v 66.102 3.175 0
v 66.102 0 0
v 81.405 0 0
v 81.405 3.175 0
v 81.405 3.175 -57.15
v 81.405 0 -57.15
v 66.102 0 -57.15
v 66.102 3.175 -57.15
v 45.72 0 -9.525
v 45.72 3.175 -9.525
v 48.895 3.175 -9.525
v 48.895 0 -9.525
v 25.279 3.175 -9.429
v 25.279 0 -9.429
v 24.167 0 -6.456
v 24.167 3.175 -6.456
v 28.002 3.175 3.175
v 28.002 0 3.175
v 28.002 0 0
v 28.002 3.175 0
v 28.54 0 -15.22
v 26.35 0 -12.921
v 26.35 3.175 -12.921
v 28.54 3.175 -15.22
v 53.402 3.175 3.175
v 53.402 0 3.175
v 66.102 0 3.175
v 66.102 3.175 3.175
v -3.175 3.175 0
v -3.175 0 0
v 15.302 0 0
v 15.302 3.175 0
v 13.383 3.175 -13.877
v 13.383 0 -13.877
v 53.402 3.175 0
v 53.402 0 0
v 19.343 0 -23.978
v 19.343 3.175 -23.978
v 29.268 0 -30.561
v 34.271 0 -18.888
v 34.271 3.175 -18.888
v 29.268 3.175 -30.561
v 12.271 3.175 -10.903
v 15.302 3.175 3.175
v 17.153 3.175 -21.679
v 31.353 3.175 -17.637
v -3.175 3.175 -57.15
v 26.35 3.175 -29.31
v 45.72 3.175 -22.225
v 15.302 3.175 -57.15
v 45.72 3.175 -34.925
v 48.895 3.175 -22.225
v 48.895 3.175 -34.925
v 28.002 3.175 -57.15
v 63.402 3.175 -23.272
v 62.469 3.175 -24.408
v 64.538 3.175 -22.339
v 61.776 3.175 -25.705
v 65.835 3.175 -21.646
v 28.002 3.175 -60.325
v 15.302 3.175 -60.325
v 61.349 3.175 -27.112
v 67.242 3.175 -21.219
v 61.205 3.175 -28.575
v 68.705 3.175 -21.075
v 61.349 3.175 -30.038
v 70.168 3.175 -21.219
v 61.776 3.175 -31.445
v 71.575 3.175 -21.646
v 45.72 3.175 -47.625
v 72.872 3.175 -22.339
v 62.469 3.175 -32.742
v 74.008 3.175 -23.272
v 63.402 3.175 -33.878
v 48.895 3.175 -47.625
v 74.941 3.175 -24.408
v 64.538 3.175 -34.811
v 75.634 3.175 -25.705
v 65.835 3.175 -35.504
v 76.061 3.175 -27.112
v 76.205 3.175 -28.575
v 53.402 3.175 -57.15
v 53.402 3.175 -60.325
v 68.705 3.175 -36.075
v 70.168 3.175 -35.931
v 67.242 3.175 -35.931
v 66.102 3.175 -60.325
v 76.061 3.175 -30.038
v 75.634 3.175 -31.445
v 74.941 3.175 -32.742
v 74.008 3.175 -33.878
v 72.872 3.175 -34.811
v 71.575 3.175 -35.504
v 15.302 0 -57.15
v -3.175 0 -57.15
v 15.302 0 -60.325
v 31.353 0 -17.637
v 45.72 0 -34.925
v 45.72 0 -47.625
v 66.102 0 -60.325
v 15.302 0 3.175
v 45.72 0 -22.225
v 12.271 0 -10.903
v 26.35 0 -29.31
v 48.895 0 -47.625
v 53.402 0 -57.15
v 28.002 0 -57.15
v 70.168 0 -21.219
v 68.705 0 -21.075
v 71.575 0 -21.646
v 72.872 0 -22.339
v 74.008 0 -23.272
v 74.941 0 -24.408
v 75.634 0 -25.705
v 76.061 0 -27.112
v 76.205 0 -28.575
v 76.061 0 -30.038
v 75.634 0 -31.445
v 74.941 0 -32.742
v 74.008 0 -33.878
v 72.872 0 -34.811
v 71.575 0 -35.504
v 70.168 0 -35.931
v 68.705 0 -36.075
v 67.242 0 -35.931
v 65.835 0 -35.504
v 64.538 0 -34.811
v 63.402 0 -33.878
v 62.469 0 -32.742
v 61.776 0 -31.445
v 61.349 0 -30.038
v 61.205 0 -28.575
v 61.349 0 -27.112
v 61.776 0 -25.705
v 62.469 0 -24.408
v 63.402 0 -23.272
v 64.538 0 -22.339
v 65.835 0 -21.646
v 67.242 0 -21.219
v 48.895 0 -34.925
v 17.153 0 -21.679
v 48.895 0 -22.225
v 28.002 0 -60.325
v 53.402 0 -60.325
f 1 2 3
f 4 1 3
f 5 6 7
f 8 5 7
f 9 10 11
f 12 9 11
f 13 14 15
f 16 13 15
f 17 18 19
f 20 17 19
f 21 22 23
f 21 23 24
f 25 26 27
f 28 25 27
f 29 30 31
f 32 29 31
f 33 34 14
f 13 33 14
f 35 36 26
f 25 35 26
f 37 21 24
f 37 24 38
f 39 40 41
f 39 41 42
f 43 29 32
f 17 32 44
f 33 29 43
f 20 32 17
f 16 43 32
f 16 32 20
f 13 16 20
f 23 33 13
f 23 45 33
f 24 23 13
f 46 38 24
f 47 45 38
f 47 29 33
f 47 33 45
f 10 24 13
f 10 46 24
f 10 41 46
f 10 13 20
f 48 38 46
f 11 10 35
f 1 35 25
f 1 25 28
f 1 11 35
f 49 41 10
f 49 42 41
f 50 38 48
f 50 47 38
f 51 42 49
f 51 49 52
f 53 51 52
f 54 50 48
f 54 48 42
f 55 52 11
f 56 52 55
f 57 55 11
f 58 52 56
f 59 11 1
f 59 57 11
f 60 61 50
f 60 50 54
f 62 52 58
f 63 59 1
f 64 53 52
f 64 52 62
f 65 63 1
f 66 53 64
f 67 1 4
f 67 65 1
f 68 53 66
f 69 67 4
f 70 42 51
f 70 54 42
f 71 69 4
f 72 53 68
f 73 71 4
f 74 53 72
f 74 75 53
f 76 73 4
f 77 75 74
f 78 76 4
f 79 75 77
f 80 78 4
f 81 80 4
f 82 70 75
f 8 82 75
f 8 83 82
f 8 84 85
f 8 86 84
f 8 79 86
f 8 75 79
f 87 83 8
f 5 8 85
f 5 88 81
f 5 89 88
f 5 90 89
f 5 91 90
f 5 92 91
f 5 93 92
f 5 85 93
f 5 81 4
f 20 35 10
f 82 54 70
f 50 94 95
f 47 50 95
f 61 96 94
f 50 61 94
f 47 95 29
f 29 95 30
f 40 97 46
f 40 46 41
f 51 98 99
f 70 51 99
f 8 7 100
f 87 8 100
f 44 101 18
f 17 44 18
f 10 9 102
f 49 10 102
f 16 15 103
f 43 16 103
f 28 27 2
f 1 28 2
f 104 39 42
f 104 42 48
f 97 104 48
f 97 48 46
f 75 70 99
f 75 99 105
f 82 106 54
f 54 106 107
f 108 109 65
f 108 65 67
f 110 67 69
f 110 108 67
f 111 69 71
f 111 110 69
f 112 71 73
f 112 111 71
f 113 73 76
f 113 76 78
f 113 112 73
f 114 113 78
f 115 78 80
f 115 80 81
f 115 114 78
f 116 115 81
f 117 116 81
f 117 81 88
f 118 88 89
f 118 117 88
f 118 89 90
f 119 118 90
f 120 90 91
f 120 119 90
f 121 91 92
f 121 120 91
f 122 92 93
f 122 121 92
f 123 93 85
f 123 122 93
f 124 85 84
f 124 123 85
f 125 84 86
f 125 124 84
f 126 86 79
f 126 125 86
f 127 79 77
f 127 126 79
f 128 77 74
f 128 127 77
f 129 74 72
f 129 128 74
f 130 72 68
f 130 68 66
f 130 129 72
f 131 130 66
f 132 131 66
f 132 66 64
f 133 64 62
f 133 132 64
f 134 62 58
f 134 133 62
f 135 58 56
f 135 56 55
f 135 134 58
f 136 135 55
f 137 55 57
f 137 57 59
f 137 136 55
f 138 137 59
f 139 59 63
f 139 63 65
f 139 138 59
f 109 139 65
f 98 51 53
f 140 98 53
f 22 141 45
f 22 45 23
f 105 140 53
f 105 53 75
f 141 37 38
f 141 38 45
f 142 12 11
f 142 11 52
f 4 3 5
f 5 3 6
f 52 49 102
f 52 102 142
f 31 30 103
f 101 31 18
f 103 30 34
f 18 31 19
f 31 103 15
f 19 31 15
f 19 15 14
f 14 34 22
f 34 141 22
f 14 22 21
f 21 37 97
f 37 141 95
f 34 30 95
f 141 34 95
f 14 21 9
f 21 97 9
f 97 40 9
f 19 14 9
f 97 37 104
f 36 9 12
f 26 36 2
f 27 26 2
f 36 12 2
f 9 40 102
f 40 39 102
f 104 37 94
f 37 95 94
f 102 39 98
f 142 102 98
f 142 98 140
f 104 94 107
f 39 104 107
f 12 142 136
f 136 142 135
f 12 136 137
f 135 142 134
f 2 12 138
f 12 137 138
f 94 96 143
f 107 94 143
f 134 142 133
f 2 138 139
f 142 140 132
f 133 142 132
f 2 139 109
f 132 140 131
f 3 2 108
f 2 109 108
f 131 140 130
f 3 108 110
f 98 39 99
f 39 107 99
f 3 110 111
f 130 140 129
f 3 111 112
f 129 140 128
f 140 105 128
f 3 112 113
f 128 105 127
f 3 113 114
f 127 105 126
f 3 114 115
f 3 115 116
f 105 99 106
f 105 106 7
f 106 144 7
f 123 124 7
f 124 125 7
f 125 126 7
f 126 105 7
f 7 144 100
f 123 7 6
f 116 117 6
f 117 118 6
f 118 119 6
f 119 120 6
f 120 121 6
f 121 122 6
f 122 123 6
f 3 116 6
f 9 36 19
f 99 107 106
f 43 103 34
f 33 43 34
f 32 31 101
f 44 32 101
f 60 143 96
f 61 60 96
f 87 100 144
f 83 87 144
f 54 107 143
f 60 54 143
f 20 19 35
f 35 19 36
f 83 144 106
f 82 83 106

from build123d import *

# Parameters (mm, degrees)
SKETCH1_R           = 7.5
SKETCH1_W           = 3.175
SKETCH1_H           = 12.7
BOSS_EXTRUDE1_DEPTH = 3.175


with BuildPart() as part:
    # Sketch1 → Boss-Extrude1 (new body)
    with BuildSketch(Plane(origin=(0, 0, 0), x_dir=(1, 0, 0), z_dir=(0, 1, 0))):
        Polygon((0, 0), (15.302420881, 0), (15.302420881, -3.175), (28.002420881, -3.175), (28.002420881, 0), (53.402420881, 0), (53.402420881, -3.175), (66.102420881, -3.175), (66.102420881, 0), (81.404841762, 0), (81.404841762, 19.05), (81.404841762, 38.1), (81.404841762, 57.15), (66.102420881, 57.15), (66.102420881, 60.325), (53.402420881, 60.325), (53.402420881, 57.15), (28.002420881, 57.15), (28.002420881, 60.325), (15.302420881, 60.325), (15.302420881, 57.15), (0, 57.15), (-3.175, 57.15), (-3.175, 0), align=None)
        with Locations(Location((68.704841762, 28.575, 0), (0, 0, 270))):
            Circle(SKETCH1_R, mode=Mode.SUBTRACT)
        with Locations((47.3075, 15.875)):
            Rectangle(SKETCH1_W, SKETCH1_H, mode=Mode.SUBTRACT)
        with Locations((47.3075, 41.275)):
            Rectangle(SKETCH1_W, SKETCH1_H, mode=Mode.SUBTRACT)
        Polygon((26.350084324, 29.310366676), (31.353146576, 17.637347868), (34.271401278, 18.888113431), (29.268339026, 30.561132239), align=None, mode=Mode.SUBTRACT)
        Polygon((17.153101684, 21.678911781), (26.350084324, 12.920743576), (28.539626376, 15.219989236), (19.342643735, 23.978157441), align=None, mode=Mode.SUBTRACT)
        Polygon((12.270885661, 10.90317475), (13.382794097, 13.87710895), (25.2785309, 9.429475209), (24.166622465, 6.455541008), align=None, mode=Mode.SUBTRACT)
    extrude(amount=BOSS_EXTRUDE1_DEPTH)


solid = part.part
